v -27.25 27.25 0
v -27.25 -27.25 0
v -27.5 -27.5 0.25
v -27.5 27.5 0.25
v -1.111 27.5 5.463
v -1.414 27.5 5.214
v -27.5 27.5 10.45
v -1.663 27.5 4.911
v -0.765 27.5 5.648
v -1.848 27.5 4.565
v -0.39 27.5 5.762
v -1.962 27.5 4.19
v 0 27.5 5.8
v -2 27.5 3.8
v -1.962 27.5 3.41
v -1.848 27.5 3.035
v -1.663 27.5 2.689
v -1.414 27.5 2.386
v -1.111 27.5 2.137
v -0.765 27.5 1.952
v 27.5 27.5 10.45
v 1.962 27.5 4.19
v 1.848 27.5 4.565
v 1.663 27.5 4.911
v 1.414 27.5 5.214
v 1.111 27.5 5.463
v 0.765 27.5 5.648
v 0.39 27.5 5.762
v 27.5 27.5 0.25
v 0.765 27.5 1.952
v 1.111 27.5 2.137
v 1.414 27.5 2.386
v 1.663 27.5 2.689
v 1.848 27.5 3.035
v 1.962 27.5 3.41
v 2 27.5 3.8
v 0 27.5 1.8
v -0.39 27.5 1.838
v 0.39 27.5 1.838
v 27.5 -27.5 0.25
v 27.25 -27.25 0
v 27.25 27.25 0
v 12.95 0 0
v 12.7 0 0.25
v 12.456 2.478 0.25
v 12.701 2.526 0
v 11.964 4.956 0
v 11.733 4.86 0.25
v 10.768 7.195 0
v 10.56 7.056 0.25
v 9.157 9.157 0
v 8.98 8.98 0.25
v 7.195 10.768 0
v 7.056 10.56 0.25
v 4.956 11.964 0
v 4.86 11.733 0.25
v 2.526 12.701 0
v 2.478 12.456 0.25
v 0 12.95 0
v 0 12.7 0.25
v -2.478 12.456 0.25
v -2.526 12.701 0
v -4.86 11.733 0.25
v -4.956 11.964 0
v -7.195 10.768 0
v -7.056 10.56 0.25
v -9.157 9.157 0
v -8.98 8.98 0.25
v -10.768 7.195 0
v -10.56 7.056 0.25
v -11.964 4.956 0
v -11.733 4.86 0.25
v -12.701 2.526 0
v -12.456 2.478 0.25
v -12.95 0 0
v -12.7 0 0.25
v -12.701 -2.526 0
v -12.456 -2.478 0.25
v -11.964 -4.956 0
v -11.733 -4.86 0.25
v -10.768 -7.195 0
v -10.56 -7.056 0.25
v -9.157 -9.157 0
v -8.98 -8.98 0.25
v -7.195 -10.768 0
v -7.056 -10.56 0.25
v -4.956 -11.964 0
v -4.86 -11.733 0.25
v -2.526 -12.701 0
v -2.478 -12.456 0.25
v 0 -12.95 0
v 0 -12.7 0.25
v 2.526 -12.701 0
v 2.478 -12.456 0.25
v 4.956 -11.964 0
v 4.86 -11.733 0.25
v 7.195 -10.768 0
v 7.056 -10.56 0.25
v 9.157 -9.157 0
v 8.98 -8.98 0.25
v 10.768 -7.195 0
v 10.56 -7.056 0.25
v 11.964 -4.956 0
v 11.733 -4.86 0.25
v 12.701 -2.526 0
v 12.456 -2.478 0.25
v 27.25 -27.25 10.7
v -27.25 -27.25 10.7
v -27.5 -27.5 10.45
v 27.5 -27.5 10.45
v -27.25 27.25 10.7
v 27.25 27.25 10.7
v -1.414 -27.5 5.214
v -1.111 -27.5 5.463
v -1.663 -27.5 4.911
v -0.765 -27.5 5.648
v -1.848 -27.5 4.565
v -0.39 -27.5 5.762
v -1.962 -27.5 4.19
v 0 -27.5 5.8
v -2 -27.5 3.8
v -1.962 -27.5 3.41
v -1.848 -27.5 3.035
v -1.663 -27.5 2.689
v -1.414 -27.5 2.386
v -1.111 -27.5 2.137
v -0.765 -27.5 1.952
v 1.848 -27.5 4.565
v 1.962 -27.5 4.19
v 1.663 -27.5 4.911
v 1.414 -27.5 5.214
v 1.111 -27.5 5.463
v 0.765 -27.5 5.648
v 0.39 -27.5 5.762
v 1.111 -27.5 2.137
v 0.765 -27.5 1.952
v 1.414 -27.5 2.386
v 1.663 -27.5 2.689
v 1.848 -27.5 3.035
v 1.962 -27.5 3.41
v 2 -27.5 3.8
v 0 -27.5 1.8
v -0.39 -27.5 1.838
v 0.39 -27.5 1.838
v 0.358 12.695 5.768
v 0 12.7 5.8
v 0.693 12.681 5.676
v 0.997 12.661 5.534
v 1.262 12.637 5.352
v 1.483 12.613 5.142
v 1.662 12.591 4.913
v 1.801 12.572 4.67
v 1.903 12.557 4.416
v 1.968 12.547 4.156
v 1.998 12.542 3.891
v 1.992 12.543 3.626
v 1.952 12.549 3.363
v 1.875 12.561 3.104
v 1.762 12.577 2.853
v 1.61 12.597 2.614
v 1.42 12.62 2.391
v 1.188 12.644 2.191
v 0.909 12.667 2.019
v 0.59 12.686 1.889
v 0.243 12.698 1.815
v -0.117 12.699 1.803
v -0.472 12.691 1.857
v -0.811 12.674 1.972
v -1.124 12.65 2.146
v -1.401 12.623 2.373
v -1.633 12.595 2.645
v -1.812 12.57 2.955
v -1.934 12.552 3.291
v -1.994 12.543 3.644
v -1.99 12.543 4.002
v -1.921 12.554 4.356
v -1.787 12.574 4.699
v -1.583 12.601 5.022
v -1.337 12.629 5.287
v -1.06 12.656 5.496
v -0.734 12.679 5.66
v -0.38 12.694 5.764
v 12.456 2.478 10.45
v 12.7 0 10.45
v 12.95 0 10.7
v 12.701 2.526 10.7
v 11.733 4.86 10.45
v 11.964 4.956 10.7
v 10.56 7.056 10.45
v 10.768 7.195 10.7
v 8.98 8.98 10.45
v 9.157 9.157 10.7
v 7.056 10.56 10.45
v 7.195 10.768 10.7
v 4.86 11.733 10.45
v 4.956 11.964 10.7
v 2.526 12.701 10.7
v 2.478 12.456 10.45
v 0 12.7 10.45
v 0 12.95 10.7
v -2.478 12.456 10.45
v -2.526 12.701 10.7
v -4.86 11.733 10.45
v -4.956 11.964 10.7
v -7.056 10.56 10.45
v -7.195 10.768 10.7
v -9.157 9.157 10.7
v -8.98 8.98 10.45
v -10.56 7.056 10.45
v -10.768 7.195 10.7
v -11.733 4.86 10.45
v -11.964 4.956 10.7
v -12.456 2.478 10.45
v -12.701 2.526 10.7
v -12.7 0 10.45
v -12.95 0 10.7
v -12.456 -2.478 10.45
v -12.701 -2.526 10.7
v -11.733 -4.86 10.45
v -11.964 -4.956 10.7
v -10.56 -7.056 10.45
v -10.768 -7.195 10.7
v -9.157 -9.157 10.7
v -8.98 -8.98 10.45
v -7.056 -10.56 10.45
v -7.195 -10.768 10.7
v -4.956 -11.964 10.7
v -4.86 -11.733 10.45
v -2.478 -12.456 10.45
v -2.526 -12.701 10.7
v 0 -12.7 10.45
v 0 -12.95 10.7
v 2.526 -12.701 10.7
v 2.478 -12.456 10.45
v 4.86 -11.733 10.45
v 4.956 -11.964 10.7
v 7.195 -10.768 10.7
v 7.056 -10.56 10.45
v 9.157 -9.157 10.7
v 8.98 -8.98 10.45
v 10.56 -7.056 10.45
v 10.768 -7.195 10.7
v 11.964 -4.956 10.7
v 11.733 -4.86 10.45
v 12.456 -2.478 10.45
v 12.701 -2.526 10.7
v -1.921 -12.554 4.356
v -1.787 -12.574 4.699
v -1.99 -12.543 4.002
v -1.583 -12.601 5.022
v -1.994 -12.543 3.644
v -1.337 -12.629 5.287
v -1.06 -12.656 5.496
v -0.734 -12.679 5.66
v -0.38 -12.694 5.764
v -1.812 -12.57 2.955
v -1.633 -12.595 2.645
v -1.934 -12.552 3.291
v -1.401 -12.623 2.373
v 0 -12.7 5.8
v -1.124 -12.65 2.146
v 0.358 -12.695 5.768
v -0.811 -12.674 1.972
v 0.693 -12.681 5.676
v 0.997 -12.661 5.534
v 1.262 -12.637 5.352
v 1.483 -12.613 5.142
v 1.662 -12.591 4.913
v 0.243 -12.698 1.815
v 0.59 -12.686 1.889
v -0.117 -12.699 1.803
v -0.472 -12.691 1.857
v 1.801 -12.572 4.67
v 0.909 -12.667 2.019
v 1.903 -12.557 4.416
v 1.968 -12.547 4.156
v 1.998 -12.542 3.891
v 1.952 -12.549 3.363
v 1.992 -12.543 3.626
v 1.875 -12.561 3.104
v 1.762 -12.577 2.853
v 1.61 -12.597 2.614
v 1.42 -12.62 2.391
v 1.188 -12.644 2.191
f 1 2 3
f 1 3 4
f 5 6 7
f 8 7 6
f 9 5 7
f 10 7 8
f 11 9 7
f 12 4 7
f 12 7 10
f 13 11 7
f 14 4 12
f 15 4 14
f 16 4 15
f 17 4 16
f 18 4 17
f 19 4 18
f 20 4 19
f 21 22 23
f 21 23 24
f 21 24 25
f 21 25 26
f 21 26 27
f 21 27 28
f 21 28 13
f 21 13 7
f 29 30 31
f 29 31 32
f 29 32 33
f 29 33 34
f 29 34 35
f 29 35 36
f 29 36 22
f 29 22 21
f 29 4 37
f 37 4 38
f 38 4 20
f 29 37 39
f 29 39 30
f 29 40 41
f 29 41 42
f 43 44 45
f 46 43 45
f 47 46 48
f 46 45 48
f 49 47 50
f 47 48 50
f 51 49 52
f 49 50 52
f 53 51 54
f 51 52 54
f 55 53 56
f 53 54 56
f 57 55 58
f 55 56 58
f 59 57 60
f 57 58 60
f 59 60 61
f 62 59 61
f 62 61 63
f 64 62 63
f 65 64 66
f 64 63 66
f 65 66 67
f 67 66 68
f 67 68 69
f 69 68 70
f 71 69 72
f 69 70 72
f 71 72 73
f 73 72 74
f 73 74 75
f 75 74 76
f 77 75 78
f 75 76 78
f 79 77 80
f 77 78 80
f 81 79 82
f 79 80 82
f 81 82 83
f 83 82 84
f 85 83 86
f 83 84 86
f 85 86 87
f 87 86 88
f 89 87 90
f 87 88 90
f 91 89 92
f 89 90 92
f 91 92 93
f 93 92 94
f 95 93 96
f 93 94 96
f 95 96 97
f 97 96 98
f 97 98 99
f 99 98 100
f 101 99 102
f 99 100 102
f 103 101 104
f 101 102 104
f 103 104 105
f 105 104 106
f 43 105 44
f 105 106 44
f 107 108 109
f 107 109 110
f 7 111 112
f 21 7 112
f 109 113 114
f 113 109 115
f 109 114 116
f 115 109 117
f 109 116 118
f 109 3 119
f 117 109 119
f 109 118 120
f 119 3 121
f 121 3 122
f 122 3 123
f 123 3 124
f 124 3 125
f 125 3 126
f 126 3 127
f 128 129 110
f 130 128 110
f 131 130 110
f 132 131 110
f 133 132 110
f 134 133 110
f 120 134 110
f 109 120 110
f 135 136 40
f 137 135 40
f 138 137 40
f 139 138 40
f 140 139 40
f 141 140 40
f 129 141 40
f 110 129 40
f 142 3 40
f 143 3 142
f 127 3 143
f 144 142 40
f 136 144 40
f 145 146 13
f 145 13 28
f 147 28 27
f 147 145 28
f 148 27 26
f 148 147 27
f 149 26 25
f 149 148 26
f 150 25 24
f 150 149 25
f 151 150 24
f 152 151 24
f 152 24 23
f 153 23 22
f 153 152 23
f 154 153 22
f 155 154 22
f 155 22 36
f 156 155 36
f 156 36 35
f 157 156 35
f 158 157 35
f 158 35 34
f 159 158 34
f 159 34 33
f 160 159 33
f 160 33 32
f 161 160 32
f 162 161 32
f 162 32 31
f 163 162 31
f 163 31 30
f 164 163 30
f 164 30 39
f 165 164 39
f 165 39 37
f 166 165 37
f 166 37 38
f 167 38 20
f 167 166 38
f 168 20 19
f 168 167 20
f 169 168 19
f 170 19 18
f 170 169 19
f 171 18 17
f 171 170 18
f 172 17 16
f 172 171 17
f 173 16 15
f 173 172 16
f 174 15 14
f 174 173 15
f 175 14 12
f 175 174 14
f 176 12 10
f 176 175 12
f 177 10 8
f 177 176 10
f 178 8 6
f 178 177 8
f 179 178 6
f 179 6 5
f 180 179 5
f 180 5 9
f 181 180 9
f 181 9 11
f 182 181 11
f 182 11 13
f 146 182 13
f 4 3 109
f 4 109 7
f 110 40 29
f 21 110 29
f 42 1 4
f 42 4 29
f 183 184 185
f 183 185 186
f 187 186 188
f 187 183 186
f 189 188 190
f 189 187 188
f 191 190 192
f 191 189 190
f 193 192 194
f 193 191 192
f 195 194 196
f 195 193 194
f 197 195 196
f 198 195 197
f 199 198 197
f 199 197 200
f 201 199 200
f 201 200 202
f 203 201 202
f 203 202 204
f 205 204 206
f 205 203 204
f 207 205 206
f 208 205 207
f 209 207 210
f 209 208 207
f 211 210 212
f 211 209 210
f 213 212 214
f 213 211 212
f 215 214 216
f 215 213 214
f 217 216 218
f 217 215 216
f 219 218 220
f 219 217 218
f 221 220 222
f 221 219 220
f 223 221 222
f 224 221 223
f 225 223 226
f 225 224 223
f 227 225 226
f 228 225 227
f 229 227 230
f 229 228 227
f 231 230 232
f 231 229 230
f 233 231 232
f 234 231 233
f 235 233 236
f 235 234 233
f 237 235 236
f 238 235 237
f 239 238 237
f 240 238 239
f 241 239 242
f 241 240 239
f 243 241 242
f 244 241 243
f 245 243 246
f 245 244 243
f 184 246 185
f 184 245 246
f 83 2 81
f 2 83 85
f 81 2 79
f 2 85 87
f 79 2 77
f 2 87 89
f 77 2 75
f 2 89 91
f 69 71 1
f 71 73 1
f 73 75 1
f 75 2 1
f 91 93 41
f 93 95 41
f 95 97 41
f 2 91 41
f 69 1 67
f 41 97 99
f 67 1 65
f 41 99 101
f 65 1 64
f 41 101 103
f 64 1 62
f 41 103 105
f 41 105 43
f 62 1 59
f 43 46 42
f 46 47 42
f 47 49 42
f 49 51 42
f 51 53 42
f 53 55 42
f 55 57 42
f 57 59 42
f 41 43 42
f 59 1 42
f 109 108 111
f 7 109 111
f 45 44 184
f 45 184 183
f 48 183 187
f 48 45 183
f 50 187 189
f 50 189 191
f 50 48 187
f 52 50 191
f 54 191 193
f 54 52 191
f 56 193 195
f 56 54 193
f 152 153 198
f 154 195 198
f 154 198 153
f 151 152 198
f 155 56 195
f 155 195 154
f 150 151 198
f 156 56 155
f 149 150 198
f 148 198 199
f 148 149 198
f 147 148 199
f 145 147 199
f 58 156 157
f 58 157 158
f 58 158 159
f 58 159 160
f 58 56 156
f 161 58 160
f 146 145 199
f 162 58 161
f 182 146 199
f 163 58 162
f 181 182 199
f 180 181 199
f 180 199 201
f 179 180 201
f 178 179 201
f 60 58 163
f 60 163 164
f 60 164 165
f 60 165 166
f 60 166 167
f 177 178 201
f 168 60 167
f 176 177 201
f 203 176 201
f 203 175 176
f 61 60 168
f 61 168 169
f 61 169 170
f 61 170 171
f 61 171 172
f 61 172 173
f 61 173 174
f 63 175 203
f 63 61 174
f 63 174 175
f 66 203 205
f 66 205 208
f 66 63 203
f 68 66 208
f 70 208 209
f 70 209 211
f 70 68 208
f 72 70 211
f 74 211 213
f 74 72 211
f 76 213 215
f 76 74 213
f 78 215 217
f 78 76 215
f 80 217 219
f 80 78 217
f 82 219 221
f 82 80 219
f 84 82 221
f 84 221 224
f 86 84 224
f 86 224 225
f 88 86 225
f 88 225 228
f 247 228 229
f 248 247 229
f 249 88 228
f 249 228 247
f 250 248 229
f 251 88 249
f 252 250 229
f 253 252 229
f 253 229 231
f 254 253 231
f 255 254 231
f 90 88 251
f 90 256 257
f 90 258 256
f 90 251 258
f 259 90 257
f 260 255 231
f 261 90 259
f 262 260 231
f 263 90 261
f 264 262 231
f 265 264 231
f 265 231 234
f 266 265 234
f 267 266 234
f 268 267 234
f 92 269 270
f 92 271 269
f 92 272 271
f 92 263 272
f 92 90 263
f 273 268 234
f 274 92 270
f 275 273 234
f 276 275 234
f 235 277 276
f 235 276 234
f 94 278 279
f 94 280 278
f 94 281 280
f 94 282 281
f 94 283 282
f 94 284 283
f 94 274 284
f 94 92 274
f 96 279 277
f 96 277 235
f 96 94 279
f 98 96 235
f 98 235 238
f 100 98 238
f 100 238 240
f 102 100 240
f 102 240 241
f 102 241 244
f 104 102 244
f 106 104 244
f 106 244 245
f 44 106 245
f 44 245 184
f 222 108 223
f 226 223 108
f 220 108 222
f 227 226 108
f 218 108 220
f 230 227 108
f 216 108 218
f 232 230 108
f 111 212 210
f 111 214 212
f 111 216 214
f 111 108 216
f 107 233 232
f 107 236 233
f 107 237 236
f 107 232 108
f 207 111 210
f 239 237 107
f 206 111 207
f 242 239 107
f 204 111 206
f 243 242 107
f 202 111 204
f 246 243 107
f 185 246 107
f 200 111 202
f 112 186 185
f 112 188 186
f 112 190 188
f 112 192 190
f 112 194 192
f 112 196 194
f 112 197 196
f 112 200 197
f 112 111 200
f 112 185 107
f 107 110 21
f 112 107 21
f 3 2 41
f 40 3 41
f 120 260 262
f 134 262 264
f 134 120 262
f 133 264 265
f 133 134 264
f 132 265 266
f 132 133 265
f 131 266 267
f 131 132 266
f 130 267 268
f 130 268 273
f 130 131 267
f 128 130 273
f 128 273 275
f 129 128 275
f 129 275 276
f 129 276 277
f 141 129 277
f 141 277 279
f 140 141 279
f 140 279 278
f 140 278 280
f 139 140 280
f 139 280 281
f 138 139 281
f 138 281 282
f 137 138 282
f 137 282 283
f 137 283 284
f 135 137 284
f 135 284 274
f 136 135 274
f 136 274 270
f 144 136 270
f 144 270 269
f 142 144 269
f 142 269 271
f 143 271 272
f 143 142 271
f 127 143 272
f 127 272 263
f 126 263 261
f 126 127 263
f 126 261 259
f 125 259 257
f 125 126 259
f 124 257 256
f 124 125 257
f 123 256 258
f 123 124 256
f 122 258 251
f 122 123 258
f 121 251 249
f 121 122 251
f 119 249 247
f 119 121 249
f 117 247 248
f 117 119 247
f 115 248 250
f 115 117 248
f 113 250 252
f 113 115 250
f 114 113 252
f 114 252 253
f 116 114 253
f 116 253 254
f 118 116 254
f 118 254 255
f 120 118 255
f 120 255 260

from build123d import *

# Parameters (mm, degrees)
SKETCH1_W               = 55
SKETCH1_H               = 55
SKETCH1_R               = 12.7
BOSS_EXTRUDE1_DEPTH     = 10.7
CUT_EXTRUDE1_DEPTH      = 41.335964102
CUT_EXTRUDE1_DEPTH_BACK = 41.335964102
SKETCH2_R               = 2
CHAMFER1_SIZE           = 0.25


with BuildPart() as part:
    # Sketch1 → Boss-Extrude1 (new body)
    with BuildSketch(Plane.XY):
        Rectangle(SKETCH1_W, SKETCH1_H)
        Circle(SKETCH1_R, mode=Mode.SUBTRACT)
    extrude(amount=BOSS_EXTRUDE1_DEPTH)

    # Sketch2 → Cut-Extrude1 (cut, two sides: drawn at the far end of the back side and taken through both)
    with BuildSketch(Plane(origin=(0, 0, 0), x_dir=(1, 0, 0), z_dir=(0, 1, 0)).offset(-CUT_EXTRUDE1_DEPTH_BACK)):
        with Locations(Location((0, -3.8, 0), (0, 0, 270))):
            Circle(SKETCH2_R)
    extrude(amount=CUT_EXTRUDE1_DEPTH + CUT_EXTRUDE1_DEPTH_BACK, mode=Mode.SUBTRACT)

    # Chamfer1
    chamfer1_edges = [part.edges().sort_by_distance(p)[0] for p in [
        (-12.7, 0, 0),
        (-12.7, 0, 10.7),
        (-27.5, 0, 10.7),
        (0, -27.5, 10.7),
        (27.5, 0, 10.7),
        (0, -27.5, 0),
        (-27.5, 0, 0),
        (0, 27.5, 0),
        (27.5, 0, 0),
        (0, 27.5, 10.7),
    ]]
    chamfer(chamfer1_edges, length=CHAMFER1_SIZE)


solid = part.part
